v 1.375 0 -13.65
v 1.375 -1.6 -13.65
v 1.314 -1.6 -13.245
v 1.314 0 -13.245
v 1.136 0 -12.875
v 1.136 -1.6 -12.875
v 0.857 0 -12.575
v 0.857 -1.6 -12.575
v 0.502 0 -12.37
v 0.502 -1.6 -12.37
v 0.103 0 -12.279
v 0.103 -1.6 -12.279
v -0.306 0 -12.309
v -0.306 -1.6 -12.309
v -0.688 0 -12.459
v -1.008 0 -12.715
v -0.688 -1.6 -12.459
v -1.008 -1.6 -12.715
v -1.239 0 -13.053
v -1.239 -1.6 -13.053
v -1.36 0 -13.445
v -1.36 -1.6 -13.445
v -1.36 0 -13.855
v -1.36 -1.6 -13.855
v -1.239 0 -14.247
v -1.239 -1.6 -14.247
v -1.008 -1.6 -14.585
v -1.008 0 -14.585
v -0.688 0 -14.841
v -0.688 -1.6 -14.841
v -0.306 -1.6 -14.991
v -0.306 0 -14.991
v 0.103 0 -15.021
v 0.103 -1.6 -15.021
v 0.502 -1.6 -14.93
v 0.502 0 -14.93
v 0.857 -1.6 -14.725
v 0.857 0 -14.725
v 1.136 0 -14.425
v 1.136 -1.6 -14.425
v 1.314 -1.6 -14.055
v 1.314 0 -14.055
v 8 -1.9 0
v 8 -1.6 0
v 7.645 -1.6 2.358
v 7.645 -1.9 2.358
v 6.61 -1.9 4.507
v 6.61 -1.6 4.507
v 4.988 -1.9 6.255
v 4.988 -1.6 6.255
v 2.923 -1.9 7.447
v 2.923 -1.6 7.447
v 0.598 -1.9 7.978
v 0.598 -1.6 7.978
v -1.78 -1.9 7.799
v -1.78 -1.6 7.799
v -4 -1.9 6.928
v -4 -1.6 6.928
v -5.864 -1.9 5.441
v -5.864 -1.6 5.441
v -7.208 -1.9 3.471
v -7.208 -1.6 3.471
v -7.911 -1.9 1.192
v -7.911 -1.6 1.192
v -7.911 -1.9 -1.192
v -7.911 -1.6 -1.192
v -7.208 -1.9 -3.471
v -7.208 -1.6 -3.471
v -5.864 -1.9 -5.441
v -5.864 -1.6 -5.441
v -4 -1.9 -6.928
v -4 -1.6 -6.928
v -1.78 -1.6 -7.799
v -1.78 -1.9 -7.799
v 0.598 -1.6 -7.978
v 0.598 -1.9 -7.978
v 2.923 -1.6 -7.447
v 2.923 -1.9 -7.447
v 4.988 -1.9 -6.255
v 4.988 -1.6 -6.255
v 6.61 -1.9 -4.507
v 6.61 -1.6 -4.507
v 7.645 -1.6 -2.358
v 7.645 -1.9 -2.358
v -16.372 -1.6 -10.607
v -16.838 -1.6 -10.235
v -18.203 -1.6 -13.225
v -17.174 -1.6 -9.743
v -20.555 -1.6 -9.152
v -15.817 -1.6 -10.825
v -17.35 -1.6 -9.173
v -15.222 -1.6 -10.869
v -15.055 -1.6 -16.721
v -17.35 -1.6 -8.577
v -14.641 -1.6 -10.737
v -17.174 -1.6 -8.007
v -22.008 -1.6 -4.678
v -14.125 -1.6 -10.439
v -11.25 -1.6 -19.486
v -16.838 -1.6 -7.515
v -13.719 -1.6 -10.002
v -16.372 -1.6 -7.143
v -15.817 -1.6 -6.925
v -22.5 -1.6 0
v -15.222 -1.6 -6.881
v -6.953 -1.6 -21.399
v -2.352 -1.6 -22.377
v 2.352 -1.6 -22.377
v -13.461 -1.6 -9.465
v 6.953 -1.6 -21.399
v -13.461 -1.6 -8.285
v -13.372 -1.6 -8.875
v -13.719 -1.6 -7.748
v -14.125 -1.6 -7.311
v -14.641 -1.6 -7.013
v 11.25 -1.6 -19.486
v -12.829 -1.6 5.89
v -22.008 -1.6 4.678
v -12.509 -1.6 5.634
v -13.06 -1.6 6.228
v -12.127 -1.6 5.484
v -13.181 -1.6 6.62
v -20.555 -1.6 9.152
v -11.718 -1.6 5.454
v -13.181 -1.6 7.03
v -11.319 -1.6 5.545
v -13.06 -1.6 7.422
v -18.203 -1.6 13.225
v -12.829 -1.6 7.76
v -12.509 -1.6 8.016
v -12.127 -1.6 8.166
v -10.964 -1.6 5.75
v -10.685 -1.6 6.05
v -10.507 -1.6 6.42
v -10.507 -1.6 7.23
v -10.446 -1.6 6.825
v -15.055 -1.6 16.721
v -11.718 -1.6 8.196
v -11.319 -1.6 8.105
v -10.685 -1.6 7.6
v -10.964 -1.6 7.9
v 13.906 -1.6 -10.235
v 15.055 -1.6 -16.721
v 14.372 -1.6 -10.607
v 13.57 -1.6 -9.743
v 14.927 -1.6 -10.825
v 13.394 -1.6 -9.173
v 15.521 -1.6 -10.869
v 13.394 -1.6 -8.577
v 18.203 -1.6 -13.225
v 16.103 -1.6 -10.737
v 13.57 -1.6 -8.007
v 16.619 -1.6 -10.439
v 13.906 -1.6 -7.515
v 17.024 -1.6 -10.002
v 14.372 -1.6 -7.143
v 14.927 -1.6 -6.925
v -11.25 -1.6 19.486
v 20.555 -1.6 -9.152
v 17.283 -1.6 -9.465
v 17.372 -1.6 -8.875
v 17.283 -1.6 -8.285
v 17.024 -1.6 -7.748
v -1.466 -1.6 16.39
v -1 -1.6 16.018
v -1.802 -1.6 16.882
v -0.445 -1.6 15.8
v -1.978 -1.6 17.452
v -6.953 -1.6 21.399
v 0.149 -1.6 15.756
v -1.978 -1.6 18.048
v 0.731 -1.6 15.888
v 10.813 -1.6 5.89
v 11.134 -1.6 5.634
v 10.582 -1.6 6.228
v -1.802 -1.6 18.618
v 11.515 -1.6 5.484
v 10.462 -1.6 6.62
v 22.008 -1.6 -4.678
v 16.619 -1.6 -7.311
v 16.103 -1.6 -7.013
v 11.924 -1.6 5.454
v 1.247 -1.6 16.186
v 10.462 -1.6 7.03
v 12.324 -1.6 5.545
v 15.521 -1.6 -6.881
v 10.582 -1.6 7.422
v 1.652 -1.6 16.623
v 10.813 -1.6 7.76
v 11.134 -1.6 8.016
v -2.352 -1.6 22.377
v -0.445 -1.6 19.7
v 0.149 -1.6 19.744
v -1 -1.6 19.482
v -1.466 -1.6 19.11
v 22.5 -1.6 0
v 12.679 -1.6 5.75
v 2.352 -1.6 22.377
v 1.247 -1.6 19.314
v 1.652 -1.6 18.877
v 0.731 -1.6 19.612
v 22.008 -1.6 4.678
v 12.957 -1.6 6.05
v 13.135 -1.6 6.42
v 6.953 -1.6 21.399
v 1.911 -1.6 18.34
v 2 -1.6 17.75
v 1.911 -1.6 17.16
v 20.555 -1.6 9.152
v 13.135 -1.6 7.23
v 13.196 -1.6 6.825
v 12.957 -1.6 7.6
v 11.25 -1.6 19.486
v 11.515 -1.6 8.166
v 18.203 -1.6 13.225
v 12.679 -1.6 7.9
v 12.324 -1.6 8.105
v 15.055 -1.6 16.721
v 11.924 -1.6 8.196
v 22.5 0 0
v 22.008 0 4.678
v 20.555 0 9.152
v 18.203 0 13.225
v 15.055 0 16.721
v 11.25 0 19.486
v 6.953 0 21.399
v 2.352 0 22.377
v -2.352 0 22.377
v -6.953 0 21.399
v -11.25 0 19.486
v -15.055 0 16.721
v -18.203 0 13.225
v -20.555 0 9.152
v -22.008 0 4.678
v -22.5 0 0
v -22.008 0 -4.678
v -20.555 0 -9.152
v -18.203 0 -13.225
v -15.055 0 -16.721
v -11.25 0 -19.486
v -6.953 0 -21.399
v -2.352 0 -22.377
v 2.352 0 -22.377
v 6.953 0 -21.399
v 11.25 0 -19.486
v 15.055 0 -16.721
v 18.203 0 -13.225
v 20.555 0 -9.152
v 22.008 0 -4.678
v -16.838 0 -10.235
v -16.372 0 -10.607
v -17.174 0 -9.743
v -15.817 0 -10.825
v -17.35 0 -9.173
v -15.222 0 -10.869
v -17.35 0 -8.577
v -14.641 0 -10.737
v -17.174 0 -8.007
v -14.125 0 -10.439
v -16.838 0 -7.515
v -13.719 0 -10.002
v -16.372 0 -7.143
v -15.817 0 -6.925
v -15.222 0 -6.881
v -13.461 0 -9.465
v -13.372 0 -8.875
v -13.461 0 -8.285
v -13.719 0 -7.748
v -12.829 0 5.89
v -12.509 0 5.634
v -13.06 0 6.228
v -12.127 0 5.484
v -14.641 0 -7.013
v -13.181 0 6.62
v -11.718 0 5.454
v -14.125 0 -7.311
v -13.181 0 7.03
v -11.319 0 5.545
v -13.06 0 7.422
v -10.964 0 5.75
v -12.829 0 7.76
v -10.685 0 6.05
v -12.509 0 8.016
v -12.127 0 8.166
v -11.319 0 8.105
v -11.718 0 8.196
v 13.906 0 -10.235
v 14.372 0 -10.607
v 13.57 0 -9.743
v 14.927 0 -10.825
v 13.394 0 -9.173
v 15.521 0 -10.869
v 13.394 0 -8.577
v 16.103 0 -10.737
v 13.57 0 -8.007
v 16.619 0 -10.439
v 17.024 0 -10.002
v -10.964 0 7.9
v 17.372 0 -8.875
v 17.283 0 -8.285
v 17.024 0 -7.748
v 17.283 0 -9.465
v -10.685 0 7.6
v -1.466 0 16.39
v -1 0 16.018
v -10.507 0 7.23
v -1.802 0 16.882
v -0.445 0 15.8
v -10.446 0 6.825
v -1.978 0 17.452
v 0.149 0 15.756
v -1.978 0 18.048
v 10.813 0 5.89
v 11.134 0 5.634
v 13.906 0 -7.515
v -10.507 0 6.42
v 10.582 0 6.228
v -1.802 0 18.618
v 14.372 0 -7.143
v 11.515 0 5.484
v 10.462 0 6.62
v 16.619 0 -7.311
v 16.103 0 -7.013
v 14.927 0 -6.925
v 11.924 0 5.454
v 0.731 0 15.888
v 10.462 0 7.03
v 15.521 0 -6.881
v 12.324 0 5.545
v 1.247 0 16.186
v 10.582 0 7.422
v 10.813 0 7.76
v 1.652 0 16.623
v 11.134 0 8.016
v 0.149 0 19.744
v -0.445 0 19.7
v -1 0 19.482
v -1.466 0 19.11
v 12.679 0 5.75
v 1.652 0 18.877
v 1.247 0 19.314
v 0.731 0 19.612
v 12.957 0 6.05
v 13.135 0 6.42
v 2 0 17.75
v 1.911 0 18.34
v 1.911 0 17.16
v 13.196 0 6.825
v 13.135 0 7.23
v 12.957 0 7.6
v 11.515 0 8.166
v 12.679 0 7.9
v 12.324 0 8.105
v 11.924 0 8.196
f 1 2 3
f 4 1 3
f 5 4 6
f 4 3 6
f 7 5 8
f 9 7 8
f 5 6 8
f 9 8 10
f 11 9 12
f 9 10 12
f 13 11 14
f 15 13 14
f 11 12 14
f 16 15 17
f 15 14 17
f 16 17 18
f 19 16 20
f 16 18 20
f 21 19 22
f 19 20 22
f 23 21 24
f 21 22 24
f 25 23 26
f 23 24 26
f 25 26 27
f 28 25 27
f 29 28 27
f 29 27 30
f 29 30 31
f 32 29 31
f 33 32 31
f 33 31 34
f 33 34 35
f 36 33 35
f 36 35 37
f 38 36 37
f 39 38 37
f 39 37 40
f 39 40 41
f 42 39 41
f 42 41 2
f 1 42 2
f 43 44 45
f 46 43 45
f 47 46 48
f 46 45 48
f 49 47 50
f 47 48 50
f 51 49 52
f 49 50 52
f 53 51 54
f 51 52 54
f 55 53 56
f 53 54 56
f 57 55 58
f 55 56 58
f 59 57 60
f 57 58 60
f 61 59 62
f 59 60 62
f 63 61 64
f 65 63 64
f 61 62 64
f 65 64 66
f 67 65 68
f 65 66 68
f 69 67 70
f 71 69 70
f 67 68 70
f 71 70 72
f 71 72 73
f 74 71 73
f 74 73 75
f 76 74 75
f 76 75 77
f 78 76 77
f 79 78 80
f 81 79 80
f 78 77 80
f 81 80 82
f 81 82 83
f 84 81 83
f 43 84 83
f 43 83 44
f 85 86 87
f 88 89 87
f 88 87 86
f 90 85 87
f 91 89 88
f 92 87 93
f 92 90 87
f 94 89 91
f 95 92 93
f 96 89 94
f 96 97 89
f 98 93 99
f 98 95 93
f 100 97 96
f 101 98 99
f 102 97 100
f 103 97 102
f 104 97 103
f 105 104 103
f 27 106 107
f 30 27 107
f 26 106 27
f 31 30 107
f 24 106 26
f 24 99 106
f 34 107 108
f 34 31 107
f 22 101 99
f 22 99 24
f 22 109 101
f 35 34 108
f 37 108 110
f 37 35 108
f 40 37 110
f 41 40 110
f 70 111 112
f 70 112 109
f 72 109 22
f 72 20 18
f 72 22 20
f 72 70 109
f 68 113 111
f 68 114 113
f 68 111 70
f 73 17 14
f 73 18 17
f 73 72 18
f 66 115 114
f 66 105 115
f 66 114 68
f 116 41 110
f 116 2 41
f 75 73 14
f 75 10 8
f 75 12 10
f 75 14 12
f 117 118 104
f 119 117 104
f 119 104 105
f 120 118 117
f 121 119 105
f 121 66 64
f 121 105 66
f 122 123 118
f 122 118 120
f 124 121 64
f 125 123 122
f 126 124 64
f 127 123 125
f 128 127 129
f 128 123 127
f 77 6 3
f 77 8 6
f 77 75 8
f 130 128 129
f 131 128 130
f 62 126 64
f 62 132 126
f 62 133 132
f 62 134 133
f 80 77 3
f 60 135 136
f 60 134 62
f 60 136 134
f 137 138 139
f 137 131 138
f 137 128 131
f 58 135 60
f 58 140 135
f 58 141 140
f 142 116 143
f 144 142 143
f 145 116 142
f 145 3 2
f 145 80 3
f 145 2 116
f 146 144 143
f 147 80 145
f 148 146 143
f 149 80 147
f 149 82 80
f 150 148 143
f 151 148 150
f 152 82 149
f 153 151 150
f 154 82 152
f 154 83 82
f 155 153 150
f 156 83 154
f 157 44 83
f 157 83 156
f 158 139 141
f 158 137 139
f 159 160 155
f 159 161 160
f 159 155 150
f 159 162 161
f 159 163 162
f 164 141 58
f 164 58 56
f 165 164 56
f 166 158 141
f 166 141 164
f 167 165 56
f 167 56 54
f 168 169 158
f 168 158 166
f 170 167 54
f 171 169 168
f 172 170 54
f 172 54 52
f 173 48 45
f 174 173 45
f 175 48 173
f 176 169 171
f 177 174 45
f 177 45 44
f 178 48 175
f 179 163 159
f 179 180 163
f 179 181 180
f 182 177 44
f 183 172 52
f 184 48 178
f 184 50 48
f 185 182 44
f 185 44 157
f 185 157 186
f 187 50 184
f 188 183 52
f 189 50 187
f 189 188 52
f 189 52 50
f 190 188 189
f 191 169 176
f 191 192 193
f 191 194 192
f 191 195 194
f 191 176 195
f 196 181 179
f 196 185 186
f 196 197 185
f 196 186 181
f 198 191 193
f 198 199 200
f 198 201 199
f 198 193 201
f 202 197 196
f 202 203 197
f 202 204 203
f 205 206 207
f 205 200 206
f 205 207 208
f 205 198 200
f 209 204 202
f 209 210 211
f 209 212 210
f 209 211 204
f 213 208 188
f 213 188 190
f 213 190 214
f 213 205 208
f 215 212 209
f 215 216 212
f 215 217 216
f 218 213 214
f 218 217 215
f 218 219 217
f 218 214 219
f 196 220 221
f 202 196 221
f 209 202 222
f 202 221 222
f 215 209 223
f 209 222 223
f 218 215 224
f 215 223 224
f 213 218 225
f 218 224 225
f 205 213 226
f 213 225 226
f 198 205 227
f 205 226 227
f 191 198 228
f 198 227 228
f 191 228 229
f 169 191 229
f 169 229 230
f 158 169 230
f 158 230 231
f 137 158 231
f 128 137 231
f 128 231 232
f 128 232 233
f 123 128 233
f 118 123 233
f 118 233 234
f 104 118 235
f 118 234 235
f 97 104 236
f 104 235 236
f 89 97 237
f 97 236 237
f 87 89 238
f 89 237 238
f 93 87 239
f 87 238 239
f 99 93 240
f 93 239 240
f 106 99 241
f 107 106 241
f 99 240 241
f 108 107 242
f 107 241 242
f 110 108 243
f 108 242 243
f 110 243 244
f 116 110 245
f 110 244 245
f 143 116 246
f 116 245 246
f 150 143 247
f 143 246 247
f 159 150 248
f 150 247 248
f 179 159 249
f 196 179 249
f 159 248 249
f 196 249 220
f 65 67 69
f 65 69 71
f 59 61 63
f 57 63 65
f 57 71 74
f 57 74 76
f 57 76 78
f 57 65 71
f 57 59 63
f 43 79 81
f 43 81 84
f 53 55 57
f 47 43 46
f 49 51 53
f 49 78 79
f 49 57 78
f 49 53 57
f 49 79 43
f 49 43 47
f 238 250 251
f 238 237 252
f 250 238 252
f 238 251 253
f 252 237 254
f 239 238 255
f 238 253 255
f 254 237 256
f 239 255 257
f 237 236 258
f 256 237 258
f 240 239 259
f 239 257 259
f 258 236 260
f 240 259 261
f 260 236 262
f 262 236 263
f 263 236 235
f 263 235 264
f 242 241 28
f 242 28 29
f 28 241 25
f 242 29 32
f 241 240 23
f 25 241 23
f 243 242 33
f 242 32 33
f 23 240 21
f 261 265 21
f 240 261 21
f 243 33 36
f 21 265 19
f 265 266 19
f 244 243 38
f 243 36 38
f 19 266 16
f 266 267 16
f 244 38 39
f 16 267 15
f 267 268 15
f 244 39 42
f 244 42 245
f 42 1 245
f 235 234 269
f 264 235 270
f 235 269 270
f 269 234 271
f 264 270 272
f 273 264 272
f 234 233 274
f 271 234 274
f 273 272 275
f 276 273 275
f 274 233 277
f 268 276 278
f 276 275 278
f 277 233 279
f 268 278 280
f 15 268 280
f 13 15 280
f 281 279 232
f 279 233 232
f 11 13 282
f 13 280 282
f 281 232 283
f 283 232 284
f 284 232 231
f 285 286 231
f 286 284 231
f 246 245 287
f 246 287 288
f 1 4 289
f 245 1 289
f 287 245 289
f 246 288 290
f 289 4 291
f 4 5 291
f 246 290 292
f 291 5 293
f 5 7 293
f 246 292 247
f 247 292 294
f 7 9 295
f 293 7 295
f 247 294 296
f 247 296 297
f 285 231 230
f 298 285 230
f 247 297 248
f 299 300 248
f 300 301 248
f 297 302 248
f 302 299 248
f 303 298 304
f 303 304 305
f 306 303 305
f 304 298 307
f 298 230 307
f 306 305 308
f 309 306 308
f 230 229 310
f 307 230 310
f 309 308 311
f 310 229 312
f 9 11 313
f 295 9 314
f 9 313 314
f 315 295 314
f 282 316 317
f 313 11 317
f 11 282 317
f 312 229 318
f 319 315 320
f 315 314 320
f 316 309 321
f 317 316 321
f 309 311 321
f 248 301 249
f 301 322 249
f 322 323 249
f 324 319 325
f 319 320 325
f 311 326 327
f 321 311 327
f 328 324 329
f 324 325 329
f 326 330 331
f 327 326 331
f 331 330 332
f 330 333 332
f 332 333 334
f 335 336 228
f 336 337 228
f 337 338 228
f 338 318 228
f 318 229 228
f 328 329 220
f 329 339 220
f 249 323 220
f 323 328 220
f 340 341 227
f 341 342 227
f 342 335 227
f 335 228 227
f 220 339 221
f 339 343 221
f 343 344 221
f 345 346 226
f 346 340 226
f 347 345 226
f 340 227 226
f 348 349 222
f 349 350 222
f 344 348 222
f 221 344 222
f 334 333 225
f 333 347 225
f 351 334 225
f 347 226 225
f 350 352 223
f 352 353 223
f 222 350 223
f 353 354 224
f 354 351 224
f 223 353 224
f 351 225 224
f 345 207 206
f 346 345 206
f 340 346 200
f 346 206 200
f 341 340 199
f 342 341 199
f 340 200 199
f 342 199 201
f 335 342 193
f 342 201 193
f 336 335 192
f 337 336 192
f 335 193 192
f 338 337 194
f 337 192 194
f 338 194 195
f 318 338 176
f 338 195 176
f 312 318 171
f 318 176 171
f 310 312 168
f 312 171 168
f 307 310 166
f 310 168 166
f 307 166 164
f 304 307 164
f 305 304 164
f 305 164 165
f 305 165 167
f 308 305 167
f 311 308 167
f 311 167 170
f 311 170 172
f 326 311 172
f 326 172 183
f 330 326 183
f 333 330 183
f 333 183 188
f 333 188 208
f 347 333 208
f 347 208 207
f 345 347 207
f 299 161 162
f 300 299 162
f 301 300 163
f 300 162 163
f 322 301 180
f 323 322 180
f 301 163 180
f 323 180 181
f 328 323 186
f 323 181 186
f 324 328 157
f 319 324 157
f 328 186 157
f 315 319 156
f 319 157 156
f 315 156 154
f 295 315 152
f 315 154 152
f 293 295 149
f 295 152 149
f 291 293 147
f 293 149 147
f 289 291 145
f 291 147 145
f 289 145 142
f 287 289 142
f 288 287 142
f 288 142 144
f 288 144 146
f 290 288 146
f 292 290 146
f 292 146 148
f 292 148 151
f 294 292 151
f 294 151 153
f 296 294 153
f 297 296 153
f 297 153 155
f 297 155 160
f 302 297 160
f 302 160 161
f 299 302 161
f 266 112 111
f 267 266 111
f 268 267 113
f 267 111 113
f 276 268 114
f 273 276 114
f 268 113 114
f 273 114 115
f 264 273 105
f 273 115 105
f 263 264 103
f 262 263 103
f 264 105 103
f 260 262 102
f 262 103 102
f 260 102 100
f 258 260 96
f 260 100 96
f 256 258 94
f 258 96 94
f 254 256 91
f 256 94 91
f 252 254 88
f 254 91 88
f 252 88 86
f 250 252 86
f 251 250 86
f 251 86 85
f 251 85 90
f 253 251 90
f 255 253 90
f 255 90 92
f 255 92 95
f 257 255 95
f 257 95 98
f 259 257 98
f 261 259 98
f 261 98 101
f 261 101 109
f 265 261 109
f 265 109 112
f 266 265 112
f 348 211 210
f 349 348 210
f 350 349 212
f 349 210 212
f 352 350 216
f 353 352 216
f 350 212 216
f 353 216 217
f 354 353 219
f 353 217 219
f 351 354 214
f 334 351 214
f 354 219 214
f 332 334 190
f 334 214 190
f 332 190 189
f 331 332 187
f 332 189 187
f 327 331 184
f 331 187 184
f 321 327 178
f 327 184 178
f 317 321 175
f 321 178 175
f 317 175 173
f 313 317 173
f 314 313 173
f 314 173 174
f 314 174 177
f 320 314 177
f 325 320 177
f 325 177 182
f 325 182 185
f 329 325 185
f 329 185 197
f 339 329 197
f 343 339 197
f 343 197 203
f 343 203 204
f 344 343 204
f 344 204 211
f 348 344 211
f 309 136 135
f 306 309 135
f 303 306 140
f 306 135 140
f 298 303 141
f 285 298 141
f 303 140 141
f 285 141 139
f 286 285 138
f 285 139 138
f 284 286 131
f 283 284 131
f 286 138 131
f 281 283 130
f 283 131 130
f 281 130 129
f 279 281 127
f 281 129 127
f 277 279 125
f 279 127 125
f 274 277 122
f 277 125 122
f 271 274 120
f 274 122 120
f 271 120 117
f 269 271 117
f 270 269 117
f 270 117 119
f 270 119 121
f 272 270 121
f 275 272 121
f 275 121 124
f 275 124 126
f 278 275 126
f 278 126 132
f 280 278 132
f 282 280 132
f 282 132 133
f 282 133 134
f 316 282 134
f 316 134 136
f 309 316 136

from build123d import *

# Parameters (mm, degrees)
F0_R     = 22.5
F1_DEPTH = 1.6
F2_R     = 8
F3_DEPTH = 0.3
F5_D     = 4
F7_D     = 2.75


with BuildPart() as f1:
    # F0 (on Front) → F1 (new body)
    with BuildSketch(Plane.XZ):
        Circle(F0_R)
    extrude(amount=F1_DEPTH)

    # F2 (on face) → F3 (join)
    with BuildSketch(Plane.XZ.offset(1.6)):
        Circle(F2_R)
    extrude(amount=F3_DEPTH)

    # F5 (through all)
    with Locations(Plane(origin=(0, 0, 0), x_dir=(-1, 0, 0), z_dir=(0, 1, 0))):
        with Locations((0, 17.75), (-15.371951, -8.875), (15.371951, -8.875)):
            Hole(F5_D / 2)

    # F7 (through all)
    with Locations(Plane(origin=(0, 0, 0), x_dir=(-1, 0, 0), z_dir=(0, 1, 0))):
        with Locations((11.821247, 6.825), (0, -13.65), (-11.821247, 6.825)):
            Hole(F7_D / 2)


solid = f1.part
